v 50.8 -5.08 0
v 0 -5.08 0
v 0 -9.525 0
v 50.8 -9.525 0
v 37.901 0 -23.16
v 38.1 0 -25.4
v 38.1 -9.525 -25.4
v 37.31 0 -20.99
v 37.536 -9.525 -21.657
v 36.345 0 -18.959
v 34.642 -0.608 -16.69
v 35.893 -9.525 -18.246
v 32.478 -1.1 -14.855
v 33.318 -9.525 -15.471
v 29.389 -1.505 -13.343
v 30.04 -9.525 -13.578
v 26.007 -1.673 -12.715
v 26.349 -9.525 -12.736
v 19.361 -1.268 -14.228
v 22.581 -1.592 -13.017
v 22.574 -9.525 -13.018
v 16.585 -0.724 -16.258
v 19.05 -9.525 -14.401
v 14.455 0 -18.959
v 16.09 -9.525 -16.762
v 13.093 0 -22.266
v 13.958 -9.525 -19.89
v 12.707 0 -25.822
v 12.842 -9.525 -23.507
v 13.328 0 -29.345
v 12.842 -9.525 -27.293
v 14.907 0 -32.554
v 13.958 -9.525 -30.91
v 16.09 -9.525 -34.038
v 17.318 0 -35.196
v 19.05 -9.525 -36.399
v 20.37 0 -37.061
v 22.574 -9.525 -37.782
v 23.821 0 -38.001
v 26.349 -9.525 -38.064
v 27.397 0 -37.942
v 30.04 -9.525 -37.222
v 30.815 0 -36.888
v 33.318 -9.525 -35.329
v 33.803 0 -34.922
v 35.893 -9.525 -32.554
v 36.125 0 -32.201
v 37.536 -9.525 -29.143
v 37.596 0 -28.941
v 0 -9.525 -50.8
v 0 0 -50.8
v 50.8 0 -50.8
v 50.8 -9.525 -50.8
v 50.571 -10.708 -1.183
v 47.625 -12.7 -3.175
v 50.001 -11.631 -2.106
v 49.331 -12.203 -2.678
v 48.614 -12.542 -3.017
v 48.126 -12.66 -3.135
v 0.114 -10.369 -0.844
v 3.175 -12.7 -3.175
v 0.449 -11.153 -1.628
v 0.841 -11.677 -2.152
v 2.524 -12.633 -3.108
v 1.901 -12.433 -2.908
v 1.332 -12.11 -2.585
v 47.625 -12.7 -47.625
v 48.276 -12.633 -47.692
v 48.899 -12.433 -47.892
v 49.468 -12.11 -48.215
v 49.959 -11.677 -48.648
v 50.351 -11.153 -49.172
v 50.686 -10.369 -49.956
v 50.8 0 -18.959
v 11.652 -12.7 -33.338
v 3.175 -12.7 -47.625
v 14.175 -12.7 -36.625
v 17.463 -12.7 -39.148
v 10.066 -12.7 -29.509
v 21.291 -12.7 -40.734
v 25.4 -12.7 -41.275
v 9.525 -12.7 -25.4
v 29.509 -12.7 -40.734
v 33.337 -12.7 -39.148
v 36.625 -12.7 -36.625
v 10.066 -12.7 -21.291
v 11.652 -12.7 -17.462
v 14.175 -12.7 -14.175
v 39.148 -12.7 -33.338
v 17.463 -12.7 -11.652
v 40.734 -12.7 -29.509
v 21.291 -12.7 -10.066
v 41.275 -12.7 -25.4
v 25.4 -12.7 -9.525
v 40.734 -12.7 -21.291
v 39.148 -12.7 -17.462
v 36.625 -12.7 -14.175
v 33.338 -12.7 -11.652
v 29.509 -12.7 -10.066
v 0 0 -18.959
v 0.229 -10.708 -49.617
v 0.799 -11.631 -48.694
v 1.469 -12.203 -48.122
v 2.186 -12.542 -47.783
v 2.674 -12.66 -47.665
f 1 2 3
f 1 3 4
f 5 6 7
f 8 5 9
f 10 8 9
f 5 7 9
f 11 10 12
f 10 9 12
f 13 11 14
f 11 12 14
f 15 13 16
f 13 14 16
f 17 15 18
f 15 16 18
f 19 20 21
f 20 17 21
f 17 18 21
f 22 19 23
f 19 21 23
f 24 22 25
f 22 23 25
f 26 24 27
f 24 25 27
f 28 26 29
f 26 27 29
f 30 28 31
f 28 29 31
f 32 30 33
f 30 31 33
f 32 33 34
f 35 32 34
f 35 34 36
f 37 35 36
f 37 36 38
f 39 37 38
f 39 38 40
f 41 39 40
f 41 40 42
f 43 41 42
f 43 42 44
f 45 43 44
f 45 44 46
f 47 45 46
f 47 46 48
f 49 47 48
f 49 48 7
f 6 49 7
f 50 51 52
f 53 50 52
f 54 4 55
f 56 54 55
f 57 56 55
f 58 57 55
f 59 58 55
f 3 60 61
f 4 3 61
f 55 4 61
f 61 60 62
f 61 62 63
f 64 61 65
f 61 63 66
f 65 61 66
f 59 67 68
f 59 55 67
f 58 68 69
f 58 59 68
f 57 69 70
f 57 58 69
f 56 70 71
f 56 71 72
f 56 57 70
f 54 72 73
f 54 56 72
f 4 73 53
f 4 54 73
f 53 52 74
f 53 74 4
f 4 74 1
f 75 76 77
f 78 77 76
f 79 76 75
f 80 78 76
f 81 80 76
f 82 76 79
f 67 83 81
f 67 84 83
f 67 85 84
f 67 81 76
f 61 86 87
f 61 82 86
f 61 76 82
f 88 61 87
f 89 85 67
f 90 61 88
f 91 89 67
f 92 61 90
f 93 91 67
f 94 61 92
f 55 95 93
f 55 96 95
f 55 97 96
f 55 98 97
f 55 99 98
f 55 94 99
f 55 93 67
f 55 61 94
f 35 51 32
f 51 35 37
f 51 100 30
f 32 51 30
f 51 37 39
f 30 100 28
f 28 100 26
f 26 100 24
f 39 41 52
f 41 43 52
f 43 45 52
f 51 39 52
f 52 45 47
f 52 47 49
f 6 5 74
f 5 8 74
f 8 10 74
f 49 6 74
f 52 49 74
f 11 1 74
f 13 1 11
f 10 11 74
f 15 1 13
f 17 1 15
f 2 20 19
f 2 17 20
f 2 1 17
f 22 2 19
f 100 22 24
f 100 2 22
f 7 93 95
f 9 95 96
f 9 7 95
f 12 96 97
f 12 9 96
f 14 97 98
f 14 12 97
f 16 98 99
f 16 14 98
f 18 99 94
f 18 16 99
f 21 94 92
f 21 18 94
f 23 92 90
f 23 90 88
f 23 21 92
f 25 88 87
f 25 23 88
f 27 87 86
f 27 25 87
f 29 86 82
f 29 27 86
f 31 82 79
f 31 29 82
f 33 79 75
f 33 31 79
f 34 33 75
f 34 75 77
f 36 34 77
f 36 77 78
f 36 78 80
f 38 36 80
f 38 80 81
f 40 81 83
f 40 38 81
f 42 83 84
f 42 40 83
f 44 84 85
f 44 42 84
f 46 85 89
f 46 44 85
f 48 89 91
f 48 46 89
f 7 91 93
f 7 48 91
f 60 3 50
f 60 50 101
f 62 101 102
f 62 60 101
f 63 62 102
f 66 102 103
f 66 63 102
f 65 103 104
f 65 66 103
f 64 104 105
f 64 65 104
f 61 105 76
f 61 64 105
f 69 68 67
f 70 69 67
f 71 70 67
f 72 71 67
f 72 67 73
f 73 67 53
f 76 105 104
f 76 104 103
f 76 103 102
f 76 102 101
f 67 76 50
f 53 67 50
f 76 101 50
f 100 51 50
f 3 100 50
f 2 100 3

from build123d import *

# Parameters (mm, degrees)
F0_W        = 50.8
F0_H        = 50.8
F1_DEPTH    = 12.7
F2_R        = 12.7
F3_DEPTH    = 25.4
F4_R        = 3.175
F5_T1_DEPTH = 60.7801869736
F6_T1_DEPTH = 149.2615438243


# Not quite as in the source:
# - a fillet or chamfer that OpenCascade refuses, or shapes differently, is made with other operations: its cross-section is extruded or revolved along the edge and cut away or added


with BuildPart() as f1:
    # F0 (on Front) → F1 (new body)
    with BuildSketch(Plane.XZ):
        with Locations((25.4, -25.4)):
            Rectangle(F0_W, F0_H)
    extrude(amount=F1_DEPTH)

    # F2 (on face) → F3 (cut)
    with BuildSketch(Plane.XZ.offset(12.7)):
        with Locations((25.4, -25.4)):
            Circle(F2_R)
    extrude(amount=-F3_DEPTH, mode=Mode.SUBTRACT)

    # F4
    f4_edges = [f1.edges().sort_by_distance(p)[0] for p in [
        (0, -12.7, -25.4),
        (50.8, -12.7, -25.4),
    ]]
    fillet(f4_edges, radius=F4_R)

    # F5: chamfer of 3.175 on 3 edges, made by hand

    # F5_s2 → F5_t1 (cut)
    with BuildSketch(Plane.YZ.offset(-4.9900934868)):
        Polygon((-9.525, 0), (-12.7, -3.175), (-12.7, 0), align=None)
        Polygon((-12.7, -47.625), (-9.525, -50.8), (-12.7, -50.8), align=None)
    extrude(amount=F5_T1_DEPTH, mode=Mode.SUBTRACT)

    # F5_s3 → F5_t4 (revolve, cut)
    with BuildSketch(Plane.XY.offset(-25.4)):
        Polygon((41.275, -12.7), (38.1, -9.525), (38.1, -12.7), align=None)
    revolve(axis=Axis((25.4, -12.7, -25.4), (0, -1, 0)), mode=Mode.SUBTRACT)

    # F6: chamfer of 5.08 x 18.9588181024 on 1 edges, made by hand

    # F6_s2 → F6_t1 (cut)
    with BuildSketch(Plane.YZ.offset(-49.2307719121)):
        Polygon((-5.08, 0), (0, -18.9588181024), (0, 0), align=None)
    extrude(amount=F6_T1_DEPTH, mode=Mode.SUBTRACT)


solid = f1.part
